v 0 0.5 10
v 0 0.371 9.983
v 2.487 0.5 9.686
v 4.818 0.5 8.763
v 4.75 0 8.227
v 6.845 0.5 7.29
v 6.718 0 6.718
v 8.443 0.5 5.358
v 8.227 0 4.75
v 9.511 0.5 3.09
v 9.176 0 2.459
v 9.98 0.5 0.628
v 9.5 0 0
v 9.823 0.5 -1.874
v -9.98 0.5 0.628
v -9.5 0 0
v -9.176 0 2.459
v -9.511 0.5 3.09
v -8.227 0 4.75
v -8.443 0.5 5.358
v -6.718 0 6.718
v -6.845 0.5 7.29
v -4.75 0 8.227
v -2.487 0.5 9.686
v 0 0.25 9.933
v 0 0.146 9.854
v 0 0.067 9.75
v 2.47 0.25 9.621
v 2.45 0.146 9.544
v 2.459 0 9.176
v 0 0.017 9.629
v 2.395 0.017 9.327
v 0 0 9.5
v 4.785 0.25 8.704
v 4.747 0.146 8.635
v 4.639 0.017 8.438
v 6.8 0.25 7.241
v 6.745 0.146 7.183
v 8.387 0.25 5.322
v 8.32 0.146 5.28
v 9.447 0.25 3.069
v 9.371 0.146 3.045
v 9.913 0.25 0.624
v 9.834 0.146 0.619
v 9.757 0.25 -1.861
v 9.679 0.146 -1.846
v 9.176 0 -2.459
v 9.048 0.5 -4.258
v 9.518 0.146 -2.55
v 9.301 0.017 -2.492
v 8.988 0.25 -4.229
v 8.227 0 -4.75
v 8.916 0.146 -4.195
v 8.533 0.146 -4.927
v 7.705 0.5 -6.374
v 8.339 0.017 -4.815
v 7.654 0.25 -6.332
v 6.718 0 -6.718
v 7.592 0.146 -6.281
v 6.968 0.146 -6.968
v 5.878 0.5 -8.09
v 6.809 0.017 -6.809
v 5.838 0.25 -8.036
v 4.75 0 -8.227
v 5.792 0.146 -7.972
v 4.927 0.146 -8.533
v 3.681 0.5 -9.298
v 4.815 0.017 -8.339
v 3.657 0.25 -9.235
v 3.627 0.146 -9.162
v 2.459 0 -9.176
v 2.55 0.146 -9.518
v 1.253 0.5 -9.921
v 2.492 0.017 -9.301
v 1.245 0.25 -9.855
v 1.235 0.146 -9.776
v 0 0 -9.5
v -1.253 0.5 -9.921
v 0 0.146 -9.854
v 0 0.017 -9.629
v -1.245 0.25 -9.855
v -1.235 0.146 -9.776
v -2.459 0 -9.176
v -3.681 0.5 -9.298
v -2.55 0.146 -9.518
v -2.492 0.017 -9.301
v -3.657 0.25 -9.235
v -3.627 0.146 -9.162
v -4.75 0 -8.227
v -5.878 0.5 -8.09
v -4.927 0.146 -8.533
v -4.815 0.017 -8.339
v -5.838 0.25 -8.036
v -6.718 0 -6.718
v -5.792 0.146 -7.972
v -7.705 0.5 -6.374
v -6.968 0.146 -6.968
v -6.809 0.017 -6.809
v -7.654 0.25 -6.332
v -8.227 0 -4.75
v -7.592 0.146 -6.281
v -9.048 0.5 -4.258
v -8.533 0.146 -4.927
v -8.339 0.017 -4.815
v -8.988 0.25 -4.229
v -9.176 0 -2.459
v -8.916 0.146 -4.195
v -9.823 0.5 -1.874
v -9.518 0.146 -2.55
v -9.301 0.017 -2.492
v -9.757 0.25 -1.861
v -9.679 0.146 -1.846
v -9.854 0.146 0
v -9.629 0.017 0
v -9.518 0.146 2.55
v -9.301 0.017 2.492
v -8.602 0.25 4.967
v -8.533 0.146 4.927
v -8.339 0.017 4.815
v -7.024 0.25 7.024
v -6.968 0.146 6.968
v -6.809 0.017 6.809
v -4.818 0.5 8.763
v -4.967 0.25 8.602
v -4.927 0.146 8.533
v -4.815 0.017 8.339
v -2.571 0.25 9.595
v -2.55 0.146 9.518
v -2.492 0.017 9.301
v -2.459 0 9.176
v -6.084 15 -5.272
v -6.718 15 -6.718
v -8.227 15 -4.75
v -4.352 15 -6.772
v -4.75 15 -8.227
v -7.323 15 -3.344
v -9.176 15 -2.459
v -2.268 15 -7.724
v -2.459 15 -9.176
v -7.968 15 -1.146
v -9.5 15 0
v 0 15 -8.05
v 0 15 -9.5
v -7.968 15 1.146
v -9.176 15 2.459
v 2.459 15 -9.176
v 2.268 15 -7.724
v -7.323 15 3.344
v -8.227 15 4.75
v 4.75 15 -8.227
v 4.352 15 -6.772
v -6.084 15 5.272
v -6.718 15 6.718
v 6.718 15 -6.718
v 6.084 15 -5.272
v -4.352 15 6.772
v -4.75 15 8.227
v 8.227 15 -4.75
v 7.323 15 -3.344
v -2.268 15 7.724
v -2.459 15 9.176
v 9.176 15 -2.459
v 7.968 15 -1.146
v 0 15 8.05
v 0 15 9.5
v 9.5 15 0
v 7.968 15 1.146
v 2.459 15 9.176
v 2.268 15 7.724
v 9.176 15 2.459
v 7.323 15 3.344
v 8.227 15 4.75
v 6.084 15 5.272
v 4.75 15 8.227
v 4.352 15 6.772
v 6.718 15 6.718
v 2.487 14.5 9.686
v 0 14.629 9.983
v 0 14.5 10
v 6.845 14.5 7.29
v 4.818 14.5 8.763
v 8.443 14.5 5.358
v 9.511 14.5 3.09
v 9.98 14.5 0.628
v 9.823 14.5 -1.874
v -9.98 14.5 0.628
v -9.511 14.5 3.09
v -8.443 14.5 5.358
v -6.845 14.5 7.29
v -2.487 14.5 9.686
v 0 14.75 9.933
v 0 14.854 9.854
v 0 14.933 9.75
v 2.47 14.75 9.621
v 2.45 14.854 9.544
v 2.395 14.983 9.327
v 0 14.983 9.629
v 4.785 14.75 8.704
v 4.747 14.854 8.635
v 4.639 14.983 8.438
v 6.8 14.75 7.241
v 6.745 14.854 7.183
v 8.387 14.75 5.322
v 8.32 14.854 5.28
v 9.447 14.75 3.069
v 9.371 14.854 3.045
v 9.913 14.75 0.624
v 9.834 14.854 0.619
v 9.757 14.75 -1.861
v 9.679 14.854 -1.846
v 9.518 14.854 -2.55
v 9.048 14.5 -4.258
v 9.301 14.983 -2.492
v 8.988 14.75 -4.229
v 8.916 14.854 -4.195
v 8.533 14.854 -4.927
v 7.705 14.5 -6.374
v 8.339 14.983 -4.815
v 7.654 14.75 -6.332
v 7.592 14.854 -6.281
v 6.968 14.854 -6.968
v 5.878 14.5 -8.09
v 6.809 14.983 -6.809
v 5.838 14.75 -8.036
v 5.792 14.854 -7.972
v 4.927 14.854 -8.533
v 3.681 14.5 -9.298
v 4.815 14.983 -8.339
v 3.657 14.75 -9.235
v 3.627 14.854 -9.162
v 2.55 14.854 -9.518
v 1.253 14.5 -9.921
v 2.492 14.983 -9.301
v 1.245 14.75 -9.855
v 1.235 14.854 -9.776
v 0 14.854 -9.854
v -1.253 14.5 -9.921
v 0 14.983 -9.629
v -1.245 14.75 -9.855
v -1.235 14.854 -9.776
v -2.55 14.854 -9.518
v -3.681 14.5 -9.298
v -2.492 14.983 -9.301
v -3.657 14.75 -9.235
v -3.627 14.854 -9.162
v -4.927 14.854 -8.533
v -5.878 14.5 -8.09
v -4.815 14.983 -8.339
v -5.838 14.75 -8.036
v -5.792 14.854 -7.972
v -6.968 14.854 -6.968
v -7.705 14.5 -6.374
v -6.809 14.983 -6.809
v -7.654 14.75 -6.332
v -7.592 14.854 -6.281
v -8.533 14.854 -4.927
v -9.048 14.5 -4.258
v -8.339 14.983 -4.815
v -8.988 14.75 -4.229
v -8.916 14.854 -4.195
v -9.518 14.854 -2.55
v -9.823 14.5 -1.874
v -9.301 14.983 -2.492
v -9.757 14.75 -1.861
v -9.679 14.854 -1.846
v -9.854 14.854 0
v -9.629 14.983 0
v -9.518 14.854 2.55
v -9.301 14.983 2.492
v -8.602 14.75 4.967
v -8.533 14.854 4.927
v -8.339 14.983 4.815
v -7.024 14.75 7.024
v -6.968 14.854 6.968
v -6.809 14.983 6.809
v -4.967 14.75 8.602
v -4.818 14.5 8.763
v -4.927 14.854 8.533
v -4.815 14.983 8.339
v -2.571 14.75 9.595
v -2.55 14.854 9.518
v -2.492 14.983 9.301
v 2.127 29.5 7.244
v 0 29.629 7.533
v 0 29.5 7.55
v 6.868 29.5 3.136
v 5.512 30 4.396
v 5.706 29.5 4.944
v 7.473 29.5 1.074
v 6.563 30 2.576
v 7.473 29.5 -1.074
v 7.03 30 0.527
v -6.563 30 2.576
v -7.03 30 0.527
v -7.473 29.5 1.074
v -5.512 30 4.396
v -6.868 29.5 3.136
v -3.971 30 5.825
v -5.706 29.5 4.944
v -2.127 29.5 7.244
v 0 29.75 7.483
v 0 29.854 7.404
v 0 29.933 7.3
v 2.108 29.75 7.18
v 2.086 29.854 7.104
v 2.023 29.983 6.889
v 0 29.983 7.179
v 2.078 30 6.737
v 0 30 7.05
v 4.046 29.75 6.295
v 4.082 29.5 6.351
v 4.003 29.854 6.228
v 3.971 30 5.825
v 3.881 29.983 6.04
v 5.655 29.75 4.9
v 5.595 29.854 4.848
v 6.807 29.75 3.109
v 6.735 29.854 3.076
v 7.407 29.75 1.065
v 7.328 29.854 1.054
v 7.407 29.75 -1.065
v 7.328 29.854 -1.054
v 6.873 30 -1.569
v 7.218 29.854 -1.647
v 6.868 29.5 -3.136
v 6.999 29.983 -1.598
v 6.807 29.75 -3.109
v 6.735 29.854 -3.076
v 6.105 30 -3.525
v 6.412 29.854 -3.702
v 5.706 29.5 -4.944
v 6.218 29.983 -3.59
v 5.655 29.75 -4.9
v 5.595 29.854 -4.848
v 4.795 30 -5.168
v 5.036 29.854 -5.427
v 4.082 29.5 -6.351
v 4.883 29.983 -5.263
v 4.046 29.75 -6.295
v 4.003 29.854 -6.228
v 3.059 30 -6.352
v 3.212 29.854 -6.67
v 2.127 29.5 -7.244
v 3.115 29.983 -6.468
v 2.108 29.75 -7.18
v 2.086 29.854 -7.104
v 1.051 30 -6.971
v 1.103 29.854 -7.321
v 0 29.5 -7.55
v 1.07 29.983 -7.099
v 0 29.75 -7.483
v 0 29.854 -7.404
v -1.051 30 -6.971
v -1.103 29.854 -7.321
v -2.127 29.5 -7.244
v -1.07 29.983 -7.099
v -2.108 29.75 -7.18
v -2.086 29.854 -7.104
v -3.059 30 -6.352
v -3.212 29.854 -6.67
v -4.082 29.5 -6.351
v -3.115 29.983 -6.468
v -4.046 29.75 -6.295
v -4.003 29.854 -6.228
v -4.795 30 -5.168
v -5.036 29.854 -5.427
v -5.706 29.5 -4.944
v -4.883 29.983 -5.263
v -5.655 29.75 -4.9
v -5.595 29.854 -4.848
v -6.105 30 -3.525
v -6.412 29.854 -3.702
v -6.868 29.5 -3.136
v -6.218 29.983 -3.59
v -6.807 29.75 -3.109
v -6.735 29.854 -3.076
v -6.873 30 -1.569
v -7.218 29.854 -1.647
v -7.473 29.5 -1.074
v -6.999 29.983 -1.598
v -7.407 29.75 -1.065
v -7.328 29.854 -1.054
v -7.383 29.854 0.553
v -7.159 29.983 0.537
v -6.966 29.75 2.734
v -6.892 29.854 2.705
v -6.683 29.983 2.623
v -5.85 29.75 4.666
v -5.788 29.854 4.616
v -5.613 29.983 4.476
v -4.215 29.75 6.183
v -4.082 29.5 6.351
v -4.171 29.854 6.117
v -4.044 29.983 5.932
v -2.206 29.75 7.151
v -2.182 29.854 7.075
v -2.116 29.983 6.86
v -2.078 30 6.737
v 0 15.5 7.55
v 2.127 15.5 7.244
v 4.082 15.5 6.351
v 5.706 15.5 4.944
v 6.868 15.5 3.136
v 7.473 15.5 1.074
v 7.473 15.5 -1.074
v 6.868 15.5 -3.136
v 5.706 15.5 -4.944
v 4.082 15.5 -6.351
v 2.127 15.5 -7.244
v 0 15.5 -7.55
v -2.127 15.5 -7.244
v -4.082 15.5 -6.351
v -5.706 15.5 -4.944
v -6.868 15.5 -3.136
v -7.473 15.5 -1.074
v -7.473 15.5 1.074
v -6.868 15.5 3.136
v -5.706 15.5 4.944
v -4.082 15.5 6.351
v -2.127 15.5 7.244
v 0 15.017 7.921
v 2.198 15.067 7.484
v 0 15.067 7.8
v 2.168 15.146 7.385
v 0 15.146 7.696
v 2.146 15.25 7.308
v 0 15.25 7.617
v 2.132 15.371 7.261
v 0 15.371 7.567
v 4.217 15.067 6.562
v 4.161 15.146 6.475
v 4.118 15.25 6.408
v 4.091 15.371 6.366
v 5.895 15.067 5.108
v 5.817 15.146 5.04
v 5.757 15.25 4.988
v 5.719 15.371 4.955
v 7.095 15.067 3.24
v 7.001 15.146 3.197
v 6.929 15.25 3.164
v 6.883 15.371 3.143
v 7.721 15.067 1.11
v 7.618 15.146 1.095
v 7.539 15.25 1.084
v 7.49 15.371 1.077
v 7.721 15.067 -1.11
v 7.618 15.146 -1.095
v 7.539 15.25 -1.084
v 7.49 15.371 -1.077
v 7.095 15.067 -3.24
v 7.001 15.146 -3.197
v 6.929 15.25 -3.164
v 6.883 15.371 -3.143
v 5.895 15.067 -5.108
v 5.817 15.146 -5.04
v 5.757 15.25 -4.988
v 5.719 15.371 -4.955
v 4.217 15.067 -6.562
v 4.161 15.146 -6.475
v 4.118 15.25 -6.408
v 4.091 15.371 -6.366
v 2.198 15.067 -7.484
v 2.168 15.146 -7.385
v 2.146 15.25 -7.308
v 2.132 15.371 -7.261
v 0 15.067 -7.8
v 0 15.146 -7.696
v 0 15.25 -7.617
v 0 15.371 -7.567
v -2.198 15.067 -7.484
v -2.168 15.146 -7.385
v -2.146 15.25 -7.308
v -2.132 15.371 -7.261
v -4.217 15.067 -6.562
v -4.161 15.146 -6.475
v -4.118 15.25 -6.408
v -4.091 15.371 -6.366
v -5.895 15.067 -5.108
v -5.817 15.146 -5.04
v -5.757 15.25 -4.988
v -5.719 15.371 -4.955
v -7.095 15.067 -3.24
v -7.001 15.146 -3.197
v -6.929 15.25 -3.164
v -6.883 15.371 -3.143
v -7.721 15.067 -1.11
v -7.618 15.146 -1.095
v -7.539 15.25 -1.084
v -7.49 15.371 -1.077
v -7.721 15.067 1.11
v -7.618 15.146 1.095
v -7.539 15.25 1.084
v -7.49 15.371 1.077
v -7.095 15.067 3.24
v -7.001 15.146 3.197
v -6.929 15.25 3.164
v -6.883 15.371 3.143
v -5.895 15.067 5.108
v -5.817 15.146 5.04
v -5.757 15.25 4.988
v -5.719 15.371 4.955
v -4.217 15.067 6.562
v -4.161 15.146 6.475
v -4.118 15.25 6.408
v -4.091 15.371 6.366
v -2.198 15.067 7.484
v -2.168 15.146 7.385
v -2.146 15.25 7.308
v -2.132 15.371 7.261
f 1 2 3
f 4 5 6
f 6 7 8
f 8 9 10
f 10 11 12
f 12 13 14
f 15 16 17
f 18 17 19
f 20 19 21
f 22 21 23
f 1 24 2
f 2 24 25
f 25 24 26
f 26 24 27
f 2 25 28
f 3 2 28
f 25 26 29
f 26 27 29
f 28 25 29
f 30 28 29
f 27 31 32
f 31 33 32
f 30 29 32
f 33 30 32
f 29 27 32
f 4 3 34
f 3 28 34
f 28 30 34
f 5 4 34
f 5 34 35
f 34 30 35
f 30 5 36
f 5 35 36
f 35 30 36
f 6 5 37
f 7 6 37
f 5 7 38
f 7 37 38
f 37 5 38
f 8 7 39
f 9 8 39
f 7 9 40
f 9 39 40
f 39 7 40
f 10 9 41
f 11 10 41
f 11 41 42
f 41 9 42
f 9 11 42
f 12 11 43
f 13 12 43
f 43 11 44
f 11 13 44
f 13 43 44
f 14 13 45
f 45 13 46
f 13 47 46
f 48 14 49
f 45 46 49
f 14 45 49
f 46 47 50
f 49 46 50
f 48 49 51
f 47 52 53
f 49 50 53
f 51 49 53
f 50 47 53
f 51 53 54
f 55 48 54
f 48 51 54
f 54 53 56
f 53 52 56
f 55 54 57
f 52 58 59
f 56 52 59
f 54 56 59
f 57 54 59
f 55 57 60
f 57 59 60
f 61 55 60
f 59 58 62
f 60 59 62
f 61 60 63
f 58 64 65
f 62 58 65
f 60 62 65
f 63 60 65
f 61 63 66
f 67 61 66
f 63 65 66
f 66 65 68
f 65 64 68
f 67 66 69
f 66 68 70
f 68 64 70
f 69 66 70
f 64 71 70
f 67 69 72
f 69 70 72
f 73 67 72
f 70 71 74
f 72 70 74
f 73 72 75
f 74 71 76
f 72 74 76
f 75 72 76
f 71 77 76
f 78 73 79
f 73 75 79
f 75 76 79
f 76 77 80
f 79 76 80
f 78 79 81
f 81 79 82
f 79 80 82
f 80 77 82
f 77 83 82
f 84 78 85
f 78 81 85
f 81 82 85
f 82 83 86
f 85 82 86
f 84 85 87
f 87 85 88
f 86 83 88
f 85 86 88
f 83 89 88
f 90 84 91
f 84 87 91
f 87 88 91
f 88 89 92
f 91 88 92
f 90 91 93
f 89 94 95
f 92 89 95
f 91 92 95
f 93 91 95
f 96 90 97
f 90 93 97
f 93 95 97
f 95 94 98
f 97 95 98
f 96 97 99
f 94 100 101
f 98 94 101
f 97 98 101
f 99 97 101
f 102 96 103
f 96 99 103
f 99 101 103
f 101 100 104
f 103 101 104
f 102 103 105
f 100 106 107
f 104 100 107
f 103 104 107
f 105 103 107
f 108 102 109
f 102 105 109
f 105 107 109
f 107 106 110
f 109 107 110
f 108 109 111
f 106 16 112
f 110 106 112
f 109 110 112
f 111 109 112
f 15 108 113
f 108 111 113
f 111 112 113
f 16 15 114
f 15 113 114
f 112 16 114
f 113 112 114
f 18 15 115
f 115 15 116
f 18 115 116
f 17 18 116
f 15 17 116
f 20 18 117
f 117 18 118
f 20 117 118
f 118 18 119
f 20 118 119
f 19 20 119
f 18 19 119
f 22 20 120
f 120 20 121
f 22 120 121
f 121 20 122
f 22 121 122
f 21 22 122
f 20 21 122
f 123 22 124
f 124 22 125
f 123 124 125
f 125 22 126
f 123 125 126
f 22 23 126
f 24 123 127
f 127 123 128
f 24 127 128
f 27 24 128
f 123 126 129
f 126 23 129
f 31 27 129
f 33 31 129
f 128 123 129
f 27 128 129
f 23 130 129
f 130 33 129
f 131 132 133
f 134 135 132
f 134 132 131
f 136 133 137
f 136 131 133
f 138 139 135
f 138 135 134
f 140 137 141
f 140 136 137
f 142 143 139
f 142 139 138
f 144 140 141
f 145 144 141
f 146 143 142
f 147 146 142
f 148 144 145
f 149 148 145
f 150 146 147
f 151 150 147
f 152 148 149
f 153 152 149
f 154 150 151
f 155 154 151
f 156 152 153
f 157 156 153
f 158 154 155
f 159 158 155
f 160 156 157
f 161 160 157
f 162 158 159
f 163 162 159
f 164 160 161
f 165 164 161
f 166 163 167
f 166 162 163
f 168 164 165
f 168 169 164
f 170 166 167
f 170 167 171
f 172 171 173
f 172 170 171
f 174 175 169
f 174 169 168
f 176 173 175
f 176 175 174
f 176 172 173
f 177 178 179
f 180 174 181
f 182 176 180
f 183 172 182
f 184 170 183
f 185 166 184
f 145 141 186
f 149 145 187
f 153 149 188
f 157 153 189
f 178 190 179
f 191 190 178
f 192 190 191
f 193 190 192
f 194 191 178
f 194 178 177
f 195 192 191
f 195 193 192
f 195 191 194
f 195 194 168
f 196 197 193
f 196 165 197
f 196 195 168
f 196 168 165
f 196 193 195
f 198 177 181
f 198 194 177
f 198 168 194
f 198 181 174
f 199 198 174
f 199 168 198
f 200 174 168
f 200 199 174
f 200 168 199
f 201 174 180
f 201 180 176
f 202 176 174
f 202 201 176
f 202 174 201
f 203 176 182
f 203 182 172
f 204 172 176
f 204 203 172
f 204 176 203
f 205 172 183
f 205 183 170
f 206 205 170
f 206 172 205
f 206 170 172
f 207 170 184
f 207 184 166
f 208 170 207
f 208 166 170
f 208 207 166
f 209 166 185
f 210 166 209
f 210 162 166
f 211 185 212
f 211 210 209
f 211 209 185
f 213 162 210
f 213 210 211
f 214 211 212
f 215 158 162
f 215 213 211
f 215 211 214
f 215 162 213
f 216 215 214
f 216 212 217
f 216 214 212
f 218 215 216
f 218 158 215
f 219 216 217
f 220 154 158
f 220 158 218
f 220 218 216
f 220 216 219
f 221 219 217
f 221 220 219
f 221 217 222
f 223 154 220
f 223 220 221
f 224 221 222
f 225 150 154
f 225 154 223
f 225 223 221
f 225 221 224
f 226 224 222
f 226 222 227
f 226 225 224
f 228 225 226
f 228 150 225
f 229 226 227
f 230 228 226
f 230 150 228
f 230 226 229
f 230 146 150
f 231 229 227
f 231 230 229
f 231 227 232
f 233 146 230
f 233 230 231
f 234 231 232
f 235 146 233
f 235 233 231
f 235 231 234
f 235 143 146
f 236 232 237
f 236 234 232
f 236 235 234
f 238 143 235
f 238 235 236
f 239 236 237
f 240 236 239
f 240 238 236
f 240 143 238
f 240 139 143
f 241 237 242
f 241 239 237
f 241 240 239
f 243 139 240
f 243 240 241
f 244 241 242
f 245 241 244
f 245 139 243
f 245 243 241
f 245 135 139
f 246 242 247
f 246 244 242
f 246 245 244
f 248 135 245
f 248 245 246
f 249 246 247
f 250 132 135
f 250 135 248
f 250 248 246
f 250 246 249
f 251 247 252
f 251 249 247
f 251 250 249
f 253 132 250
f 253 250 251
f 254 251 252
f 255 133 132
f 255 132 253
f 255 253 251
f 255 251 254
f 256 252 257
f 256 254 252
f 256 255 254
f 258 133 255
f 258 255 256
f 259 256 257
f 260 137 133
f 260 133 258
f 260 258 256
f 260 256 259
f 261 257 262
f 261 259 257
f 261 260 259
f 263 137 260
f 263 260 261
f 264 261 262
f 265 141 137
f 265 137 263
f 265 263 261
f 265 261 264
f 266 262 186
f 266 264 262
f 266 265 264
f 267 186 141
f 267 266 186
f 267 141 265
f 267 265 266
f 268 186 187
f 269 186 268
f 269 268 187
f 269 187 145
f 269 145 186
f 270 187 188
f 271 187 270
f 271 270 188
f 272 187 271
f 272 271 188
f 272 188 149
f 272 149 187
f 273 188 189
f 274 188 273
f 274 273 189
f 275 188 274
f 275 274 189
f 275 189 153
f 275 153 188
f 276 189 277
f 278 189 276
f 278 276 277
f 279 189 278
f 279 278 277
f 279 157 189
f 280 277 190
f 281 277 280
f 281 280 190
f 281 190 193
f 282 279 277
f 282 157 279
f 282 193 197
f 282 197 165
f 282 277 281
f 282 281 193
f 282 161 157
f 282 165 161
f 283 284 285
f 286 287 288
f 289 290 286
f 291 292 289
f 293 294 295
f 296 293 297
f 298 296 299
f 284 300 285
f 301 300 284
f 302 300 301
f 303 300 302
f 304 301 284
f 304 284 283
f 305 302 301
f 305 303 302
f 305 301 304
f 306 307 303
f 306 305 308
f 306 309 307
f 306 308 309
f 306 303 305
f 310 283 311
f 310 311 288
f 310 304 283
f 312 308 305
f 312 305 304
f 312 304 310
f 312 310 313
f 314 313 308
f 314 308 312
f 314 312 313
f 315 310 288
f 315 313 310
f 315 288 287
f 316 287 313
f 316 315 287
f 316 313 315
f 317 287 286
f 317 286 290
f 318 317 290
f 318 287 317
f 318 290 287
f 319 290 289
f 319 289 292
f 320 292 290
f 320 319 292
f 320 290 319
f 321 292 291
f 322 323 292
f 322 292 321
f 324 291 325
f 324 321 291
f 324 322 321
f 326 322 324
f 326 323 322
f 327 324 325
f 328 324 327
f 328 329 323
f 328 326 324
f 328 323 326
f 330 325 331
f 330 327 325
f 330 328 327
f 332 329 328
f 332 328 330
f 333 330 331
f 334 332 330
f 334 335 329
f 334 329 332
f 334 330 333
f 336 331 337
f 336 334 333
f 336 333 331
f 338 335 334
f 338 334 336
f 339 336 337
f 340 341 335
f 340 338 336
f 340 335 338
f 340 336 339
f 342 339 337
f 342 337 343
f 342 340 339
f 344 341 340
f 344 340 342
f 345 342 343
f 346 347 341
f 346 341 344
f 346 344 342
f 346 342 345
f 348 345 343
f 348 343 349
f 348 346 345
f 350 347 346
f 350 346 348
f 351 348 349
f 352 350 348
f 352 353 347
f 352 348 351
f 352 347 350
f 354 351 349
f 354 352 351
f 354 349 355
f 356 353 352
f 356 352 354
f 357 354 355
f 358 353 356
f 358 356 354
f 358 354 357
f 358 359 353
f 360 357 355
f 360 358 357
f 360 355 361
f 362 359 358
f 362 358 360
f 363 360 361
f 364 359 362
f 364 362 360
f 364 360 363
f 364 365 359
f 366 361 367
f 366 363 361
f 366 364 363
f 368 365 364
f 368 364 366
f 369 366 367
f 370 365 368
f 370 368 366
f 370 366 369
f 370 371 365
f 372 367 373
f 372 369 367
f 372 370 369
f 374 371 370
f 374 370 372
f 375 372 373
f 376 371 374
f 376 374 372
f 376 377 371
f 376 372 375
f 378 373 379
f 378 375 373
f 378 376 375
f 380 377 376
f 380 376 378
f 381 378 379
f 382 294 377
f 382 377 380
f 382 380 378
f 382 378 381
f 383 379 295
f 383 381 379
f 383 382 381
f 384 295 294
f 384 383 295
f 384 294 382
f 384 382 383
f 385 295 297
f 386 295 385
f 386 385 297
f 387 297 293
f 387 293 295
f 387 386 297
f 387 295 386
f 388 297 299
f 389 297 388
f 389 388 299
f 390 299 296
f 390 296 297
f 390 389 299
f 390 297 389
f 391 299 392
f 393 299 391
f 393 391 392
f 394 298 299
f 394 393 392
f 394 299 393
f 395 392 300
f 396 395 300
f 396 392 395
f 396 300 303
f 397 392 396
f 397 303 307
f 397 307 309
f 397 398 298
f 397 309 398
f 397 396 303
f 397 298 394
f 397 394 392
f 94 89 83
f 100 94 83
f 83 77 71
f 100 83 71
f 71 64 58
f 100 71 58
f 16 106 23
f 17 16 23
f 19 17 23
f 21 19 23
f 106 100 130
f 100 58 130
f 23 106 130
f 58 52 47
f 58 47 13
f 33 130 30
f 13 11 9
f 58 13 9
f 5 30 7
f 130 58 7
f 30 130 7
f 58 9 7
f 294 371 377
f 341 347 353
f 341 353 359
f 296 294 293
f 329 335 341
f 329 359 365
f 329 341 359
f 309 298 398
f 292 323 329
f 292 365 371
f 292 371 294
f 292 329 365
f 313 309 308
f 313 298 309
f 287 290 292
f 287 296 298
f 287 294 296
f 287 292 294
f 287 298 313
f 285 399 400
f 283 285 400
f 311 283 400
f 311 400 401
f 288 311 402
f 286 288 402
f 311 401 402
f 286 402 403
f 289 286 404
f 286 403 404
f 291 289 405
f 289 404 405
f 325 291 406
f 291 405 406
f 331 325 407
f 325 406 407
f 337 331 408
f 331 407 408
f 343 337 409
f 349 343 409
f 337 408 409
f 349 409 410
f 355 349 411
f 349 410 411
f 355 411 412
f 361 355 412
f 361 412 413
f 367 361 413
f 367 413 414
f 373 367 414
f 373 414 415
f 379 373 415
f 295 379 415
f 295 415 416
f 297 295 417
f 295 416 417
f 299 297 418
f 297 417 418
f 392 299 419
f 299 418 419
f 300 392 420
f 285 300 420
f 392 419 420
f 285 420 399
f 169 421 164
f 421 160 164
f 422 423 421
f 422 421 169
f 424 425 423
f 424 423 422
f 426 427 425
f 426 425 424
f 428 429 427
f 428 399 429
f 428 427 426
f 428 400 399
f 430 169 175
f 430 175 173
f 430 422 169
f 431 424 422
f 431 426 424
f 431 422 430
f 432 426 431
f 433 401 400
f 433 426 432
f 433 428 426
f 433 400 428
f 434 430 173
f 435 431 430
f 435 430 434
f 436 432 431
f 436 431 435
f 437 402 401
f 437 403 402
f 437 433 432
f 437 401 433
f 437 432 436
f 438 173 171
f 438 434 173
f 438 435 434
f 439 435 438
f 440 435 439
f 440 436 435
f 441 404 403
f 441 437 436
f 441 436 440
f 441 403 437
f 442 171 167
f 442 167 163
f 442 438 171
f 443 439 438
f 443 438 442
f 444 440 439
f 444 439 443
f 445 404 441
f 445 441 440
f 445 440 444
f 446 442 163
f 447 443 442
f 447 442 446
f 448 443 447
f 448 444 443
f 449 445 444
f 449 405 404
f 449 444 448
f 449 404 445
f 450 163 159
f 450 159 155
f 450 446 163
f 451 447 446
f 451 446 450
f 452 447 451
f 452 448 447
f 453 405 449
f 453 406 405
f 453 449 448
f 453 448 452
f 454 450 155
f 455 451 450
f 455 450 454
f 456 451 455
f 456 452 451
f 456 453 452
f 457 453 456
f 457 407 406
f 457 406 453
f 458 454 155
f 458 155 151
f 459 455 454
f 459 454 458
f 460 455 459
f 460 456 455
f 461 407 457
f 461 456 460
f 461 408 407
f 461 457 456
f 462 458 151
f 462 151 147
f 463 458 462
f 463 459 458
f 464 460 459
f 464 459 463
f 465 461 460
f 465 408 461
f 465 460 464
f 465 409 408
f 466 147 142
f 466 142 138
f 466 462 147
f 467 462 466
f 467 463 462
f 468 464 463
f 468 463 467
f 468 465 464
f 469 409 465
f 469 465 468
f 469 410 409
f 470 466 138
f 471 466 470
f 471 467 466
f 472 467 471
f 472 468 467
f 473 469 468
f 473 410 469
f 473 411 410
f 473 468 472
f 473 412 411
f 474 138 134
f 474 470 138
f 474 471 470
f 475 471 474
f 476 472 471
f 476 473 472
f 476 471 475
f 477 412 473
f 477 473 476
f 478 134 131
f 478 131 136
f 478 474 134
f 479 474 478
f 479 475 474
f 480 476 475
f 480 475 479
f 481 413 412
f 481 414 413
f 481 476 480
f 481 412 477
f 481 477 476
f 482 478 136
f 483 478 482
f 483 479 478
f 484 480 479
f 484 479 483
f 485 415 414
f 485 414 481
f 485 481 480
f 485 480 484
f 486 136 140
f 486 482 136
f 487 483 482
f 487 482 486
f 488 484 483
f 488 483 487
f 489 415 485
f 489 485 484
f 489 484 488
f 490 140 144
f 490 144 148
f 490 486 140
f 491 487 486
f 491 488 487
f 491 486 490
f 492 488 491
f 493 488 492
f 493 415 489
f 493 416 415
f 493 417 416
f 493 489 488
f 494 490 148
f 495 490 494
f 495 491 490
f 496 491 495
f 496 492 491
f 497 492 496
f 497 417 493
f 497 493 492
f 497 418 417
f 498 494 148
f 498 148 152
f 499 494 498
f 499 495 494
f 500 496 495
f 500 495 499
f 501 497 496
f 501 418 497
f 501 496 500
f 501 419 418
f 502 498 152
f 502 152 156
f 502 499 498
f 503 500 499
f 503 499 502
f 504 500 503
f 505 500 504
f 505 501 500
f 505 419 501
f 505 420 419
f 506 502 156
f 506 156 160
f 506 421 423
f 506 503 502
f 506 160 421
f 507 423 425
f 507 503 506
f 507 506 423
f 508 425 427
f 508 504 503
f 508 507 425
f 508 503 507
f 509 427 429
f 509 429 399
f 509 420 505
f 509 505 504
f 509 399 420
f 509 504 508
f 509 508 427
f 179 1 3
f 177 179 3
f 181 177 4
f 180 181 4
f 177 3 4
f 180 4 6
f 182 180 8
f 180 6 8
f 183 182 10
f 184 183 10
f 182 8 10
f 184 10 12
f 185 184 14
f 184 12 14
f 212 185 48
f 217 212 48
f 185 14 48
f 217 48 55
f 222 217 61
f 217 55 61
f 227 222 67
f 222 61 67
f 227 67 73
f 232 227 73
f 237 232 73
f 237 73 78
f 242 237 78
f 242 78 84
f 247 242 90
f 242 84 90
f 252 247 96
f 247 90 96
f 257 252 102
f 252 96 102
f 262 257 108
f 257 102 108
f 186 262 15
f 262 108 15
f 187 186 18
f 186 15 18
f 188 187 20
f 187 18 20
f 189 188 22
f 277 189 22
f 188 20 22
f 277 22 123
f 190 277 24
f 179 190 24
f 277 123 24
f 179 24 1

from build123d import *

# Parameters (mm, degrees)
SKETCH1_R           = 10
BOSS_EXTRUDE1_DEPTH = 15
SKETCH2_R           = 7.55
BOSS_EXTRUDE2_DEPTH = 15
FILLET1_R           = 0.5


with BuildPart() as part:
    # Sketch1 → Boss-Extrude1 (new body)
    with BuildSketch(Plane(origin=(0, 0, 0), x_dir=(1, 0, 0), z_dir=(0, 1, 0))):
        with Locations(Location((0, 0, 0), (0, 0, 270))):
            Circle(SKETCH1_R)
    extrude(amount=BOSS_EXTRUDE1_DEPTH)

    # Sketch2 → Boss-Extrude2 (add)
    with BuildSketch(Plane(origin=(0, 15, 0), x_dir=(1, 0, 0), z_dir=(0, 1, 0))):
        with Locations(Location((0, 0, 0), (0, 0, 270))):
            Circle(SKETCH2_R)
    extrude(amount=BOSS_EXTRUDE2_DEPTH)

    # Fillet1
    fillet1_edges = [part.edges().sort_by_distance(p)[0] for p in [
        (0, 0, -10),
        (0, 15, -10),
        (0, 15, -7.55),
        (0, 30, -7.55),
    ]]
    fillet(fillet1_edges, radius=FILLET1_R)


solid = part.part
